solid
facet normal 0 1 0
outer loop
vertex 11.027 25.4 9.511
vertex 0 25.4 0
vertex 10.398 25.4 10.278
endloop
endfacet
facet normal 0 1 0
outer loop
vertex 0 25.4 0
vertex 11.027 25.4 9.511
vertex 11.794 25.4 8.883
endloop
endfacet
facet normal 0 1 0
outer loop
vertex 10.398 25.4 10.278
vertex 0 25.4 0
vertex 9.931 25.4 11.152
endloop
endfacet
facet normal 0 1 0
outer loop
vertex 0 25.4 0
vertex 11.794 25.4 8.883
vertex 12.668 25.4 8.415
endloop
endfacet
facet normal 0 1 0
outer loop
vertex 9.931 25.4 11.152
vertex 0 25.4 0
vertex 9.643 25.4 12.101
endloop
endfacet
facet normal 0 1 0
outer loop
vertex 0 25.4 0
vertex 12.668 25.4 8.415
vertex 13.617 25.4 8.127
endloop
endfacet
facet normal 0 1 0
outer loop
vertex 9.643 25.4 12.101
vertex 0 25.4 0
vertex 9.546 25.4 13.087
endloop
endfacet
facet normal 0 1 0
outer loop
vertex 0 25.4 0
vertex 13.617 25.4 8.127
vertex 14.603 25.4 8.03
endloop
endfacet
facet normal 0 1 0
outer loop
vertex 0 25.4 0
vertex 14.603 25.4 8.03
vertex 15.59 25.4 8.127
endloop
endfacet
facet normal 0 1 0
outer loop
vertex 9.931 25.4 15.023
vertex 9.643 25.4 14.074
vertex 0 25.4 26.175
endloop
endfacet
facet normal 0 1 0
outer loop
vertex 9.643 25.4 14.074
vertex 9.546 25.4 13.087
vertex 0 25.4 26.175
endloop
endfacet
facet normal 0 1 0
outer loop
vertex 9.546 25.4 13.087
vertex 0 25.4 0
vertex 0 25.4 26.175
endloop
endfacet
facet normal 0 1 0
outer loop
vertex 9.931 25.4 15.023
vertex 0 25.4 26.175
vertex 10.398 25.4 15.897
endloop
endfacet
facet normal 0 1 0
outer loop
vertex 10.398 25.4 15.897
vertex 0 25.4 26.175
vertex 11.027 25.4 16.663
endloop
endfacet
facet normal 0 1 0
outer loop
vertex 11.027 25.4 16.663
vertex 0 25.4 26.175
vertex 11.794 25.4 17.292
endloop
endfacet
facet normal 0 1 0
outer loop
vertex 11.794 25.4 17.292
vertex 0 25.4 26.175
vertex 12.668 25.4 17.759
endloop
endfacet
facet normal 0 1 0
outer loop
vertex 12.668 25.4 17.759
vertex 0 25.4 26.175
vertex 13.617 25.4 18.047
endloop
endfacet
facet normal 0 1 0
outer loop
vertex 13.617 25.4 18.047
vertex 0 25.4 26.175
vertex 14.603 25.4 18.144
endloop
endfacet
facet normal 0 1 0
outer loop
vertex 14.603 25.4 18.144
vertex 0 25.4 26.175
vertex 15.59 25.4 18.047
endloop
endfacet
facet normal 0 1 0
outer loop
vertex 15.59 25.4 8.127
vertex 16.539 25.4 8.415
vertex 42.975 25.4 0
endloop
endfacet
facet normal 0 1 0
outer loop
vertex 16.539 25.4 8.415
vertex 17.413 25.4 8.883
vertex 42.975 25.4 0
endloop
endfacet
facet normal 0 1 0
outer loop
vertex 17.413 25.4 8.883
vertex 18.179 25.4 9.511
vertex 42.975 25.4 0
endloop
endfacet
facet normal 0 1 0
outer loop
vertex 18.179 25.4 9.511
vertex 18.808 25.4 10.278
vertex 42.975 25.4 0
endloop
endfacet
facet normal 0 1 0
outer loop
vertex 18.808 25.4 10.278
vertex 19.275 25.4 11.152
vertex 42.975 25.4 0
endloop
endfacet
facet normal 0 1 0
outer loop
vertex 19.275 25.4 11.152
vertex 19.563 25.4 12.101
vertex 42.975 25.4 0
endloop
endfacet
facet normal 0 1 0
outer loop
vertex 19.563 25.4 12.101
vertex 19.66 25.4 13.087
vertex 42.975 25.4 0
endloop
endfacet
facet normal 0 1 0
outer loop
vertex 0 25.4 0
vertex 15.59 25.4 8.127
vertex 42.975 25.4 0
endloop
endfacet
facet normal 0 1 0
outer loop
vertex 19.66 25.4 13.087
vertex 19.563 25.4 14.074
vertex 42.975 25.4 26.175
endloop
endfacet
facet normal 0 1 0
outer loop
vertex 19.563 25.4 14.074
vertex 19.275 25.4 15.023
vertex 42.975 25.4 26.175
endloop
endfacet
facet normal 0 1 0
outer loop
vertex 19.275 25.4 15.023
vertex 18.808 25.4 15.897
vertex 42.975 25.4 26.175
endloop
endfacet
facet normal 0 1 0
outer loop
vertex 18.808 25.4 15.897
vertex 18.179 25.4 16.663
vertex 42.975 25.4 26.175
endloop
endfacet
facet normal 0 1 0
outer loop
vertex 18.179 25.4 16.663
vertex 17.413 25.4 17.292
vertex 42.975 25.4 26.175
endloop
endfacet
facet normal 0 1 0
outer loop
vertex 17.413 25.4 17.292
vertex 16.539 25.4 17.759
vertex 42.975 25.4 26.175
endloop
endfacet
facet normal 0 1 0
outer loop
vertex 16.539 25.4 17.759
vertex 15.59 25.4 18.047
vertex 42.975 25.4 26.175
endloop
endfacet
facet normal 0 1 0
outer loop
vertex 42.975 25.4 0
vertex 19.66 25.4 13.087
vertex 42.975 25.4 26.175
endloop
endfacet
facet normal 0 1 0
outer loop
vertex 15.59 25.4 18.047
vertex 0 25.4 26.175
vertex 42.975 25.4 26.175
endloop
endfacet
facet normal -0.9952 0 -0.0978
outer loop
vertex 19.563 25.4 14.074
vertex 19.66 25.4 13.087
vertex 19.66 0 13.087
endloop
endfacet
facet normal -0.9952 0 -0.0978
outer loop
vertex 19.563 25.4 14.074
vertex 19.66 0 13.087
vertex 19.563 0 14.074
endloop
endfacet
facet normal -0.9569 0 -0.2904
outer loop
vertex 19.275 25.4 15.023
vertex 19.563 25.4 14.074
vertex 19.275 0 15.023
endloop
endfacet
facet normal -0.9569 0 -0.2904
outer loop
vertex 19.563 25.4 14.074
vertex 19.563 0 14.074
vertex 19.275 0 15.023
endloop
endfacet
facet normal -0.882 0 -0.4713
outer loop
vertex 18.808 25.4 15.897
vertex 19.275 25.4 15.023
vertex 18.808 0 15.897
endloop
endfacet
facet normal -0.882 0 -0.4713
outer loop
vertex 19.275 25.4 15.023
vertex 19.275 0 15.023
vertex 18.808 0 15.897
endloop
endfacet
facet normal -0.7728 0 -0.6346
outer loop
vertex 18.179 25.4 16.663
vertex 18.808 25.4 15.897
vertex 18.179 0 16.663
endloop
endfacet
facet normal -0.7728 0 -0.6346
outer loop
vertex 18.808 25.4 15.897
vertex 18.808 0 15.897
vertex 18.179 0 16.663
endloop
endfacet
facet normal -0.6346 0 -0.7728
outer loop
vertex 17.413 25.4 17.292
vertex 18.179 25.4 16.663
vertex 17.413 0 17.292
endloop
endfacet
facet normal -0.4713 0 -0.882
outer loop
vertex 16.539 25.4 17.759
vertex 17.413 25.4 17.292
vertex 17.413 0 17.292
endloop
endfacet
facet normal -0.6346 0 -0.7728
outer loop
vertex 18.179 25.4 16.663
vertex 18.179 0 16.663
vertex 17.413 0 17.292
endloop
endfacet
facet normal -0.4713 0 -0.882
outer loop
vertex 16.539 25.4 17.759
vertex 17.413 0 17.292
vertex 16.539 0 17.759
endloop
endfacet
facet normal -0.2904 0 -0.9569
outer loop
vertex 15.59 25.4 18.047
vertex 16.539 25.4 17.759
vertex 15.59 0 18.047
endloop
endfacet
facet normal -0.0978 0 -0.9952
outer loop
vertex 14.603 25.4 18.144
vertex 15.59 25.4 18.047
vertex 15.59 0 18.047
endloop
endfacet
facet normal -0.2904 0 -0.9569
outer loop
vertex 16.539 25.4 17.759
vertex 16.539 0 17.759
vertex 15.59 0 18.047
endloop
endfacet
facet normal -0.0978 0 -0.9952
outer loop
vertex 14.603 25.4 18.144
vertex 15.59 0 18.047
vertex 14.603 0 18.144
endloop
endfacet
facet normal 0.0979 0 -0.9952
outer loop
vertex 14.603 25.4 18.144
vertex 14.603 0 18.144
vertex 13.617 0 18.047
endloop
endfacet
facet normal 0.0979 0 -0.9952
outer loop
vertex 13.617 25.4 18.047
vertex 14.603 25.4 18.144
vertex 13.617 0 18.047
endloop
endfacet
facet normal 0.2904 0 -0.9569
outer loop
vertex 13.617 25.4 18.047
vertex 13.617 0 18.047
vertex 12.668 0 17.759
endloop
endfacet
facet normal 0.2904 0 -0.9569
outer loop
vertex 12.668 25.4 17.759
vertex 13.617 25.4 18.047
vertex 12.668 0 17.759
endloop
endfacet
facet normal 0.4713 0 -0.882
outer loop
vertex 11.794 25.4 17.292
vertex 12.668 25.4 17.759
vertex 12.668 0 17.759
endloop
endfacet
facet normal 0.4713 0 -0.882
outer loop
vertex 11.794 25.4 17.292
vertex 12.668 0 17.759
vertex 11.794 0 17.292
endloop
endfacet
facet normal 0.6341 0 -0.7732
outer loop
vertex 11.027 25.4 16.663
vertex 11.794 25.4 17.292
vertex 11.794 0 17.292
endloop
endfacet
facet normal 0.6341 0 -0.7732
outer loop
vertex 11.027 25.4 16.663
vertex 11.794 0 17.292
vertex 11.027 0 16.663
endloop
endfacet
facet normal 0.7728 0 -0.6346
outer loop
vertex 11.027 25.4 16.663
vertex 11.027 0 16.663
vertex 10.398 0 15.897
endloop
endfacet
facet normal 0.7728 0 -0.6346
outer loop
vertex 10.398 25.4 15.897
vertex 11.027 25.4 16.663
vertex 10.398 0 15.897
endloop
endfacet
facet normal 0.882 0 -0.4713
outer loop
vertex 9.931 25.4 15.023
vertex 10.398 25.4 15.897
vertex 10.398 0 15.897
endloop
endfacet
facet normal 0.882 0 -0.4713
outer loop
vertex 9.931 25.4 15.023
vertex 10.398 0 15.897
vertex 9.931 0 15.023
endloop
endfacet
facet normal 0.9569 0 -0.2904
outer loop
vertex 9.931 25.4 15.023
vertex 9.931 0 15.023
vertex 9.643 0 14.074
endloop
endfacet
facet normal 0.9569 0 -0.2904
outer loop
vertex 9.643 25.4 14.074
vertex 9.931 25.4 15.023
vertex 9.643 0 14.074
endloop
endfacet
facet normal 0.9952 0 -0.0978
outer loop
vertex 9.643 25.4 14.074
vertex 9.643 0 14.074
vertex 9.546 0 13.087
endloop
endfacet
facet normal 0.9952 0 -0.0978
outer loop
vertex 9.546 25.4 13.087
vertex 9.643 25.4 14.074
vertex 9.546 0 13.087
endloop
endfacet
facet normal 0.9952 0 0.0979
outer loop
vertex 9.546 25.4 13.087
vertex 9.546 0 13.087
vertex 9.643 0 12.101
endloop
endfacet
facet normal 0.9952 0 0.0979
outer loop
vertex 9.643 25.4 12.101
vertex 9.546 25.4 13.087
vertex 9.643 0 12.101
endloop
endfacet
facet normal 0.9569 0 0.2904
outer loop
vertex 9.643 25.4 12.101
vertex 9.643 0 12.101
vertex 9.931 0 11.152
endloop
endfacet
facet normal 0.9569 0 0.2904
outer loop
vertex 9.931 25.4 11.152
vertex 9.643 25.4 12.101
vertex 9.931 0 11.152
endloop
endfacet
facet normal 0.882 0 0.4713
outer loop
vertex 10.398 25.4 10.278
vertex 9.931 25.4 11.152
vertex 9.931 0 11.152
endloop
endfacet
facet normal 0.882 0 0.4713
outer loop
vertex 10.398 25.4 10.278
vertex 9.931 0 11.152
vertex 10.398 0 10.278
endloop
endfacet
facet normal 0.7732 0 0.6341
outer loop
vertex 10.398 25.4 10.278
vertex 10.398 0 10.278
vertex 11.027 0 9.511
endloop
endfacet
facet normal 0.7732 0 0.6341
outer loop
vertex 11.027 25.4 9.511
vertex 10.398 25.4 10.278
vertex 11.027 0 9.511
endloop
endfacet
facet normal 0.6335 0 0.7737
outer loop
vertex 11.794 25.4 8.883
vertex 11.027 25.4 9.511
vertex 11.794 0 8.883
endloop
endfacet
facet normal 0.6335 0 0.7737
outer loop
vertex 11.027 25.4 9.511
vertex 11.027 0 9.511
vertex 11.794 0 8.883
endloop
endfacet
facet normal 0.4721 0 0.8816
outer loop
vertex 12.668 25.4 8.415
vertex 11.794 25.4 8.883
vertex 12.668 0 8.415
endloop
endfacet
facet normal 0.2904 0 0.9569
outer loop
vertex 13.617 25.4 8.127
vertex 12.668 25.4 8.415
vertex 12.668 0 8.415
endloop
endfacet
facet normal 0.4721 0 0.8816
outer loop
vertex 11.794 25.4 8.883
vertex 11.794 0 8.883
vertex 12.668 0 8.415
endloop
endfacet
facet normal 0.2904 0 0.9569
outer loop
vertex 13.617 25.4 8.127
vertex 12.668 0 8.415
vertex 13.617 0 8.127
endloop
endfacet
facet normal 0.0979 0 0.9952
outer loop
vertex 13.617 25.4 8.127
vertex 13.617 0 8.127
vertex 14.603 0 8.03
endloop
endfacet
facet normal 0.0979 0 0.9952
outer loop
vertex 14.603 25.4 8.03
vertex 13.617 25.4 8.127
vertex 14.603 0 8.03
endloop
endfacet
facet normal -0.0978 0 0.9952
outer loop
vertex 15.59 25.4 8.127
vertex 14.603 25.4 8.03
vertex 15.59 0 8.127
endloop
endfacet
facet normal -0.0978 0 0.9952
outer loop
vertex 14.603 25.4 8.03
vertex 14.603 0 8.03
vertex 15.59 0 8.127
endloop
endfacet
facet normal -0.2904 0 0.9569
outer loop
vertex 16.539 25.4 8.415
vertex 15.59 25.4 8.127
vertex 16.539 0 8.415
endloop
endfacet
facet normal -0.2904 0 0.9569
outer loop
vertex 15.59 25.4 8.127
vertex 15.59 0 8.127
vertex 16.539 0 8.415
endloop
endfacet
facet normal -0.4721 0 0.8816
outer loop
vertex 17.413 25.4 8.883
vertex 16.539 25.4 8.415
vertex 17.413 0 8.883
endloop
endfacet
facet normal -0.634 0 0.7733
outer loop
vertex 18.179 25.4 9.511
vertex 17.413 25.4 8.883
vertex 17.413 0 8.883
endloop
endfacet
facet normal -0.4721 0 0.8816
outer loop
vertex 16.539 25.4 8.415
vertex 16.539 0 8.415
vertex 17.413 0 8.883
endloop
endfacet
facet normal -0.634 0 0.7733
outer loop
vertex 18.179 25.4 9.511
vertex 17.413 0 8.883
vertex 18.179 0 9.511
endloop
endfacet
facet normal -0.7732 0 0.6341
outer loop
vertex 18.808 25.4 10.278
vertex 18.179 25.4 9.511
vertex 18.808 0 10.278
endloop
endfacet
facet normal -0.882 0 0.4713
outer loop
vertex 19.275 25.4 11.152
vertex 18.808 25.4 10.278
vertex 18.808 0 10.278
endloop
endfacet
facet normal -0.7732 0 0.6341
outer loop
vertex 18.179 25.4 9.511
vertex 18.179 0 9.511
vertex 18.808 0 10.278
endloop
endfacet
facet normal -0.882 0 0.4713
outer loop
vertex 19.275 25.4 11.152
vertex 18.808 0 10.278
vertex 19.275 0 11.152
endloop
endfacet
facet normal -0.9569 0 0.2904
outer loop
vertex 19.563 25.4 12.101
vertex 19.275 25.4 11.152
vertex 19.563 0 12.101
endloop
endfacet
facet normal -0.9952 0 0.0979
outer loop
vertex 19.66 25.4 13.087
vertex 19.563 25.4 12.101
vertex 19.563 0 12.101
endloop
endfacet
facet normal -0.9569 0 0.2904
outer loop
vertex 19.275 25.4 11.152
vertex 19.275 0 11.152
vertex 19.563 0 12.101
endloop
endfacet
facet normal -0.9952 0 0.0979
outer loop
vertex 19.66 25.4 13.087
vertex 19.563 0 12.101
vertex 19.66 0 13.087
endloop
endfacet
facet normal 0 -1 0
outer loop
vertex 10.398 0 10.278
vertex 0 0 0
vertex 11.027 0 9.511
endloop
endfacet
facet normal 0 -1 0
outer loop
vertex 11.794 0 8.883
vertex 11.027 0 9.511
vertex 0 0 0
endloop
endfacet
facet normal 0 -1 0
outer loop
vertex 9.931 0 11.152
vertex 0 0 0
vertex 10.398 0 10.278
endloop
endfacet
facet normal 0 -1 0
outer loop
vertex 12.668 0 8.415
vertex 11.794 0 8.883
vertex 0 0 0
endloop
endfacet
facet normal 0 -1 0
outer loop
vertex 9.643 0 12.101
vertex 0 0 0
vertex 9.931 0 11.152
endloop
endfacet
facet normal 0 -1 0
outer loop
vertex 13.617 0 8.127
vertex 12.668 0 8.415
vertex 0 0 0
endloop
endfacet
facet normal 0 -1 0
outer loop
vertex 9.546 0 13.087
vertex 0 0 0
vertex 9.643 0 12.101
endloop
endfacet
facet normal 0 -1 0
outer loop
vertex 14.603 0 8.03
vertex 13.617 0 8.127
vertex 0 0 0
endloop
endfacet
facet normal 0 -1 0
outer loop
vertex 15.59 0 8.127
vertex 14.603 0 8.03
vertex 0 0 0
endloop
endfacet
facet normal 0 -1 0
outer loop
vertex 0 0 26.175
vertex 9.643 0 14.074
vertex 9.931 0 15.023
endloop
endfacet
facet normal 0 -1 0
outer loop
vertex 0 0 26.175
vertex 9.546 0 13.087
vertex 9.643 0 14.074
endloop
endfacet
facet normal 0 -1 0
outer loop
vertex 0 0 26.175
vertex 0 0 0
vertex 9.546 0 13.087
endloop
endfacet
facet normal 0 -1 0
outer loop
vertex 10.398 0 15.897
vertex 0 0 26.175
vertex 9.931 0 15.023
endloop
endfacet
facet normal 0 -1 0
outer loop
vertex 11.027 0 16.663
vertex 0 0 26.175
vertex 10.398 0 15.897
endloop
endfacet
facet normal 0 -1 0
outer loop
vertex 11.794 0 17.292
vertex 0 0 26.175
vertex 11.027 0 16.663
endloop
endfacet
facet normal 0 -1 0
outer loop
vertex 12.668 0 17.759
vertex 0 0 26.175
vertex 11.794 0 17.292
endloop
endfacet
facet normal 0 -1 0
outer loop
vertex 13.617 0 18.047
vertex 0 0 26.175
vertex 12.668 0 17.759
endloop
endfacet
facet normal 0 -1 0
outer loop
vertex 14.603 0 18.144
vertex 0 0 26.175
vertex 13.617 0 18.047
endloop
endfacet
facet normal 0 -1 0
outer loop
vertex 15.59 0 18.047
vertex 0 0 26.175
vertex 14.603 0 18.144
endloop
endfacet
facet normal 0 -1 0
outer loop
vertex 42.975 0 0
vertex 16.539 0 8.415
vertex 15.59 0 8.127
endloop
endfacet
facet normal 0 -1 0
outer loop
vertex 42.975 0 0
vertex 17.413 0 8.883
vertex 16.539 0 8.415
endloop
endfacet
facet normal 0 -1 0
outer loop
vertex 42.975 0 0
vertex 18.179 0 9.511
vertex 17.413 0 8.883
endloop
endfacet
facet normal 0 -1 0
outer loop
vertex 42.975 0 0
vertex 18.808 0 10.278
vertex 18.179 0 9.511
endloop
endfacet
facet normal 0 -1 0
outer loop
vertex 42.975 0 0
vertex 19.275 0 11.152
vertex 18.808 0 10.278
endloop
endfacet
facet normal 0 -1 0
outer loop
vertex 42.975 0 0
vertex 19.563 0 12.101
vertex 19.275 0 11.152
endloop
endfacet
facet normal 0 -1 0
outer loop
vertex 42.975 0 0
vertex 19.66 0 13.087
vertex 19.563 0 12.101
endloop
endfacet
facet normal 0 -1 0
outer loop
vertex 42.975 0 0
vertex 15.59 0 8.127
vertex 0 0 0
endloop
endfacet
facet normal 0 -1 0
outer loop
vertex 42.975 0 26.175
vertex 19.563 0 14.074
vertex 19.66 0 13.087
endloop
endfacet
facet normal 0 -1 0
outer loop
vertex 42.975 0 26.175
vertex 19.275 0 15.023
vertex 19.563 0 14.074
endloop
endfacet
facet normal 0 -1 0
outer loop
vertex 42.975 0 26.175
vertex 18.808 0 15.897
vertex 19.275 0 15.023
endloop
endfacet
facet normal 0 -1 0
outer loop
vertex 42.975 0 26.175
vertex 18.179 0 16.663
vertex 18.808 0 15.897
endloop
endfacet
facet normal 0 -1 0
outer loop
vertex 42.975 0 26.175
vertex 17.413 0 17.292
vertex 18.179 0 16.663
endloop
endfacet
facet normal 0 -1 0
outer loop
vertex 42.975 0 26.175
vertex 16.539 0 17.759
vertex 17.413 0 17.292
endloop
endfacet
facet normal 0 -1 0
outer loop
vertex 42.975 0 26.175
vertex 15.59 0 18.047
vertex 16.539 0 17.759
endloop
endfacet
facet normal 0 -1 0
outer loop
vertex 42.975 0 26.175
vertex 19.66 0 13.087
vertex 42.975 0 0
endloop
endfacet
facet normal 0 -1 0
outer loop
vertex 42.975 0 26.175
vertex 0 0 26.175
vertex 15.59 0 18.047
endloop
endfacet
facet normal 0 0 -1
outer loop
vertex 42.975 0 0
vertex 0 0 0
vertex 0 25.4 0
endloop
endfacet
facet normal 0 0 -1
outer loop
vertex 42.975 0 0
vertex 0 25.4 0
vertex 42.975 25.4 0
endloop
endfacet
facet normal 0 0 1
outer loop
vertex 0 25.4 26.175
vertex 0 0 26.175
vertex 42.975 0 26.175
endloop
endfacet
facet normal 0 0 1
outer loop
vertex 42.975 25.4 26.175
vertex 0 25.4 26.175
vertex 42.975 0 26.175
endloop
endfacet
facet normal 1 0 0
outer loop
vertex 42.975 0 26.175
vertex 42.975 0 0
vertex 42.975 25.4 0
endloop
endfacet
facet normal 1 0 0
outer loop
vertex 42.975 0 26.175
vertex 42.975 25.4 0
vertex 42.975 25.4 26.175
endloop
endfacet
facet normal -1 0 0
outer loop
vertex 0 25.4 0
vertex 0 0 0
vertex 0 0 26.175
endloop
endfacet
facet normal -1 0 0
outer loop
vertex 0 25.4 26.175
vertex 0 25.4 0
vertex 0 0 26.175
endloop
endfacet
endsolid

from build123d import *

# Parameters (mm, degrees)
F0_W     = 42.9752953351
F0_H     = 26.1746868491
F1_DEPTH = 25.4
F2_R     = 5.0570652765
F3_DEPTH = 25.401


# Not quite as in the source:
# - the program builds the solid bodies; features that only make, move or delete a surface that nothing else refers to are left out


with BuildPart() as f1:
    # F0 (on Front) → F1 (new body)
    with BuildSketch(Plane.XZ):
        with Locations((21.4876476675, 13.0873434246)):
            Rectangle(F0_W, F0_H)
    extrude(amount=-F1_DEPTH)

    # F2 (on face) → F3 (cut, through all)
    with BuildSketch(Plane.XZ):
        with Locations((14.6032562479, 13.0873434246)):
            Circle(F2_R)
    extrude(amount=-F3_DEPTH, mode=Mode.SUBTRACT)


solid = f1.part
